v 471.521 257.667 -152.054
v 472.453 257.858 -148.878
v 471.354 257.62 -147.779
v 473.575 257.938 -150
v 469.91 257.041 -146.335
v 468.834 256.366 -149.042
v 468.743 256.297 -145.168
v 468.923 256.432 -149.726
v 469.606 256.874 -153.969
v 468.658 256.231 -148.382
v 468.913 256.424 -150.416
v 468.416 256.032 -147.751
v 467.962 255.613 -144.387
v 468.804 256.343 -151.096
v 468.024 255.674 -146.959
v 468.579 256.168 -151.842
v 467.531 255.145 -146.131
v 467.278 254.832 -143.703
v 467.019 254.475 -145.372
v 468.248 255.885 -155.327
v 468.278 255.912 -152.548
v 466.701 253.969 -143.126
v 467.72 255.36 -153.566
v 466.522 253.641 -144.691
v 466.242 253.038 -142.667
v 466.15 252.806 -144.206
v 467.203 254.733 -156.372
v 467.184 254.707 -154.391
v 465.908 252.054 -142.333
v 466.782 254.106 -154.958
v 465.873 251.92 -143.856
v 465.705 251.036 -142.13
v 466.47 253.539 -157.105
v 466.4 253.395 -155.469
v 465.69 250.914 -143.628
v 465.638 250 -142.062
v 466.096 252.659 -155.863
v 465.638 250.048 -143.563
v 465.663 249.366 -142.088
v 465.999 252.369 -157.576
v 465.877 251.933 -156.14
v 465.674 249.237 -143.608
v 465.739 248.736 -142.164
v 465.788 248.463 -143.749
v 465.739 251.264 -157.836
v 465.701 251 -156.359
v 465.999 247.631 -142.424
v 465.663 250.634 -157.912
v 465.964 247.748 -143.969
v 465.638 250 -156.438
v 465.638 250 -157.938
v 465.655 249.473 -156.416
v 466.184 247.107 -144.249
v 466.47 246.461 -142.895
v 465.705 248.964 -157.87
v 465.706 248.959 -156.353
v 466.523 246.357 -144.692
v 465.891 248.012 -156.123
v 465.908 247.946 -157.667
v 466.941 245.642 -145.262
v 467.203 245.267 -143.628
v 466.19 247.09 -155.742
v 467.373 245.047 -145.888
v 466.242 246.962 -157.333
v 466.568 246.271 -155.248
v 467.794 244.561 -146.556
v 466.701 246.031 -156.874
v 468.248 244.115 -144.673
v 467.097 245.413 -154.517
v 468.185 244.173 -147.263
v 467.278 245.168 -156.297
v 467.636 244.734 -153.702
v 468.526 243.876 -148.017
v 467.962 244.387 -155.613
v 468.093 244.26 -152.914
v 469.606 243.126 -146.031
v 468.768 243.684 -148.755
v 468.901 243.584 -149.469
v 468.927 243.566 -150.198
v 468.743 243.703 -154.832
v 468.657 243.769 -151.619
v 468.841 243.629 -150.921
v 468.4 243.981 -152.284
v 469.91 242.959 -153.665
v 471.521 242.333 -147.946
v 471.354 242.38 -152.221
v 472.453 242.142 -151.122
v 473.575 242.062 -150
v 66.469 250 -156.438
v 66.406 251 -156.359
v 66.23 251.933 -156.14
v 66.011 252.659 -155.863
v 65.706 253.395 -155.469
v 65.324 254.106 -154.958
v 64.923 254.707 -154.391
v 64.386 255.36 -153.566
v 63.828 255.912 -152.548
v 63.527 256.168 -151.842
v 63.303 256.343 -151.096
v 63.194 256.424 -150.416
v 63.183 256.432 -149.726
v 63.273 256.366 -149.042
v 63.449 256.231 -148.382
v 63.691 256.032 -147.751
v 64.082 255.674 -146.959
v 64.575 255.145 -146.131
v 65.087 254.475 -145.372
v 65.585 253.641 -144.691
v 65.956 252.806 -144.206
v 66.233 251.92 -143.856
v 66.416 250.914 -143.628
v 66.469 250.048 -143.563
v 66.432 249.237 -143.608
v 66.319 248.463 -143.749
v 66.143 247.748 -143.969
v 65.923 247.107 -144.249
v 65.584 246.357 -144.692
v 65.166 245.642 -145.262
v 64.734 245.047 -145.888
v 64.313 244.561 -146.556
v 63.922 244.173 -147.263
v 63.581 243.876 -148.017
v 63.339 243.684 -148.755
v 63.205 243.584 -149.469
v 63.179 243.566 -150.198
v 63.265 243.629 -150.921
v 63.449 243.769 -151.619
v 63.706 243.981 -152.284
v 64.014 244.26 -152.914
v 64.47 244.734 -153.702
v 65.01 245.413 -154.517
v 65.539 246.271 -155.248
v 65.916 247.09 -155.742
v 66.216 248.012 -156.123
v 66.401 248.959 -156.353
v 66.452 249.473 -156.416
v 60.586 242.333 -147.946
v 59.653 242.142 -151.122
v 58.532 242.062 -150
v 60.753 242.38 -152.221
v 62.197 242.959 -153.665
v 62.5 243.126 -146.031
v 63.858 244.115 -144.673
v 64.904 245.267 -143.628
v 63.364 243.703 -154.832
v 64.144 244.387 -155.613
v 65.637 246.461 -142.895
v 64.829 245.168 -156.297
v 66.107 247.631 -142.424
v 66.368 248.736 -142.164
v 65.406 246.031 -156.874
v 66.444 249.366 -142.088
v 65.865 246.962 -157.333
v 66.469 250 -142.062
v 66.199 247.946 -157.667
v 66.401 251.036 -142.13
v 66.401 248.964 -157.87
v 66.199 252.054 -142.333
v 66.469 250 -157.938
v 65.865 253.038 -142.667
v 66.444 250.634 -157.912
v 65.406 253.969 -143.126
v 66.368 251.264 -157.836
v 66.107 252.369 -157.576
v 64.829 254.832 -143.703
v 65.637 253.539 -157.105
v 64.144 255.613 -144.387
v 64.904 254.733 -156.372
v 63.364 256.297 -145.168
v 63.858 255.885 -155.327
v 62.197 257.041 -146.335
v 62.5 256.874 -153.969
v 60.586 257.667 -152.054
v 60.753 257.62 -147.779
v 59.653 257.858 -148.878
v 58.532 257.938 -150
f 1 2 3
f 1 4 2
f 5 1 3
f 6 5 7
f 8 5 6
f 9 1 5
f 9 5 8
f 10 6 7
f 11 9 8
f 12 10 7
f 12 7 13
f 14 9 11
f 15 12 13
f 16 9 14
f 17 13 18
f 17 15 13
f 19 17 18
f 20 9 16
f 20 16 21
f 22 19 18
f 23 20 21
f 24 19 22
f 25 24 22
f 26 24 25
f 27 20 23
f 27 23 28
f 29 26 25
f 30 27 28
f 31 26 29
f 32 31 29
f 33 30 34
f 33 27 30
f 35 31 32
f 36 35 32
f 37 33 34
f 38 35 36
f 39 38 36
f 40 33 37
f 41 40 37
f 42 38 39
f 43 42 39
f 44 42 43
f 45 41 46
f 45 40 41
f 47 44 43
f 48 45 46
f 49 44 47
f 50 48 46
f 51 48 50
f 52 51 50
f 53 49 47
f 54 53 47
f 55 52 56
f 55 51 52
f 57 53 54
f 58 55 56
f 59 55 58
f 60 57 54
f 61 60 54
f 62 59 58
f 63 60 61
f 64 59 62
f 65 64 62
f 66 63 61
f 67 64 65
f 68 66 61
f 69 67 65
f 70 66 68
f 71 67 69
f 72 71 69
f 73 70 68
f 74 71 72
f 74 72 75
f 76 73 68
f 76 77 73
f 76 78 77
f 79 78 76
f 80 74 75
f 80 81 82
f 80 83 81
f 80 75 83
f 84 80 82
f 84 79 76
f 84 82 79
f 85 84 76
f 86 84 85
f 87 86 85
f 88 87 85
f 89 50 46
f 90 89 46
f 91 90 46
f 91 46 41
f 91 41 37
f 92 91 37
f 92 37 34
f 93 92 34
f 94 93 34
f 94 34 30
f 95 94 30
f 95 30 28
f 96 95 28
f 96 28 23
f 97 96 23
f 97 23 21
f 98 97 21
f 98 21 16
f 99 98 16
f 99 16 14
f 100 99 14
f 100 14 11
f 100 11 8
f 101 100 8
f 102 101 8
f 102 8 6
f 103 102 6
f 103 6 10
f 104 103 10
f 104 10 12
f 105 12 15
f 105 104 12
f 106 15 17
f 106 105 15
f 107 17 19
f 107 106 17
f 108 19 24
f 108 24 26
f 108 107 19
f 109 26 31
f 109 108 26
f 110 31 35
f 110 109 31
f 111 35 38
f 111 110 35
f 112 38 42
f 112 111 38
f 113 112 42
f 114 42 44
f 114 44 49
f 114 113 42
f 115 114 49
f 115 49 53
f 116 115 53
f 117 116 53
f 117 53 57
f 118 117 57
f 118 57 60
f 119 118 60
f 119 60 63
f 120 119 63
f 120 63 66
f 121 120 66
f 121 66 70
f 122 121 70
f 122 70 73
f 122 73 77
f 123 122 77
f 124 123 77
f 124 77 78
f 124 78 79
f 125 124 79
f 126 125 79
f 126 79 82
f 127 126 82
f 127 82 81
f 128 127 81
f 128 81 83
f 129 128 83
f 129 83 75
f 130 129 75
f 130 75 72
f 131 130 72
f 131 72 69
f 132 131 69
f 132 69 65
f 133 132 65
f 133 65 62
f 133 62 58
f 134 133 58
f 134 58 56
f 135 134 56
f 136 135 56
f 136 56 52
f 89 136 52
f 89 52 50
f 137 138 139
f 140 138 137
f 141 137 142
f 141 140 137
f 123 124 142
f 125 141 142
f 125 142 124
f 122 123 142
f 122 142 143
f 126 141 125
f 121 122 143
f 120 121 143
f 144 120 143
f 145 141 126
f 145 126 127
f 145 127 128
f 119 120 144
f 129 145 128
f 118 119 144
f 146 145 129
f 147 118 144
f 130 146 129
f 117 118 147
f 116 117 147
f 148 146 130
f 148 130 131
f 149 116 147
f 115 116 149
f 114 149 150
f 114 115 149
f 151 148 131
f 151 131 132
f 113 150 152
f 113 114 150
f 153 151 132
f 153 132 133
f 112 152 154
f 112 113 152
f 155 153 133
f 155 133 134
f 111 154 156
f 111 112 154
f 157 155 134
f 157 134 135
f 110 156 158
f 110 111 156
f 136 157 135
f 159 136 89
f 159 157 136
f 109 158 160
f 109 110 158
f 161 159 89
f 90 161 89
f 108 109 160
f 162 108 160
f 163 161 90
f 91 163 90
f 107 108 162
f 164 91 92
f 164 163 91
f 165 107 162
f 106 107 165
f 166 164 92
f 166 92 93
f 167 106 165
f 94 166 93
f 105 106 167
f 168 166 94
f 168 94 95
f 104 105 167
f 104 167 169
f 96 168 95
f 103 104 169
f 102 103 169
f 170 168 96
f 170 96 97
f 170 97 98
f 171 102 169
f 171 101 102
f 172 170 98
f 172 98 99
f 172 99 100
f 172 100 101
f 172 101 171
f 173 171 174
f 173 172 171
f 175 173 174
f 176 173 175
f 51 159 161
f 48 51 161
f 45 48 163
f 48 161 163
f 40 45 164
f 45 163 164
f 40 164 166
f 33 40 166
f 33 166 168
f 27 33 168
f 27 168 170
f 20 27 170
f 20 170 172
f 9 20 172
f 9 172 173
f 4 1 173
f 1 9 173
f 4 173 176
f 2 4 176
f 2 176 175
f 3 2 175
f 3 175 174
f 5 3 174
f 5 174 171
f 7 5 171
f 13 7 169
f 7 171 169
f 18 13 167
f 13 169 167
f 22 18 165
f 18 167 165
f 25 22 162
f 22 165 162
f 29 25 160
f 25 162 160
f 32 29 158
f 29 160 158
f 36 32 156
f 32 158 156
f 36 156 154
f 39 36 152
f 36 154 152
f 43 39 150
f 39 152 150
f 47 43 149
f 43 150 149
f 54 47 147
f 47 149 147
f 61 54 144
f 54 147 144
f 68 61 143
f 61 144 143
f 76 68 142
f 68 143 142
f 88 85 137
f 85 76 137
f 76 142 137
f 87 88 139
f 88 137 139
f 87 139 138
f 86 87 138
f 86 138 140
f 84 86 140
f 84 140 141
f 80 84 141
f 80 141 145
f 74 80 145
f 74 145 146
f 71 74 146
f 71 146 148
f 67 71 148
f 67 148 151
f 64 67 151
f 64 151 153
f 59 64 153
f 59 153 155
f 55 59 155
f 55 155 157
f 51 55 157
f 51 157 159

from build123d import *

# Parameters (mm, degrees)
SKETCH1_R                          = 7.9375
SKETCH1_R_2                        = 6.4375
PIPE_CONFIGURED_21_3_X_2_3_3_DEPTH = 415.043480752
CORTE_EXTRUS_O1_DEPTH              = 562.915780451
CORTE_EXTRUS_O1_DEPTH_BACK         = 562.915780451
ESBO_O10_R                         = 7.9375
CORTE_EXTRUS_O2_DEPTH              = 562.915780609
CORTE_EXTRUS_O2_DEPTH_BACK         = 562.915780609
ESBO_O11_R                         = 7.9375


with BuildPart() as part:
    # Sketch1 → Pipe - configured 21.3 X 2.3(3) (new body)
    with BuildSketch(Plane(origin=(58.531578249, 250, -150), x_dir=(0, 0, -1), z_dir=(1, 0, 0))):
        Circle(SKETCH1_R)
        Circle(SKETCH1_R_2, mode=Mode.SUBTRACT)
    extrude(amount=PIPE_CONFIGURED_21_3_X_2_3_3_DEPTH)

    # Esboço10 → Corte-extrusão1 (cut, two sides: drawn at the far end of the back side and taken through both)
    with BuildSketch(Plane.XY.offset(-CORTE_EXTRUS_O1_DEPTH_BACK)):
        with Locations((58.531578249, 250)):
            Circle(ESBO_O10_R)
    extrude(amount=CORTE_EXTRUS_O1_DEPTH + CORTE_EXTRUS_O1_DEPTH_BACK, mode=Mode.SUBTRACT)

    # Esboço11 → Corte-extrusão2 (cut, two sides: drawn at the far end of the back side and taken through both)
    with BuildSketch(Plane.XY.offset(-CORTE_EXTRUS_O2_DEPTH_BACK)):
        with Locations((473.575059, 250)):
            Circle(ESBO_O11_R)
    extrude(amount=CORTE_EXTRUS_O2_DEPTH + CORTE_EXTRUS_O2_DEPTH_BACK, mode=Mode.SUBTRACT)


solid = part.part
